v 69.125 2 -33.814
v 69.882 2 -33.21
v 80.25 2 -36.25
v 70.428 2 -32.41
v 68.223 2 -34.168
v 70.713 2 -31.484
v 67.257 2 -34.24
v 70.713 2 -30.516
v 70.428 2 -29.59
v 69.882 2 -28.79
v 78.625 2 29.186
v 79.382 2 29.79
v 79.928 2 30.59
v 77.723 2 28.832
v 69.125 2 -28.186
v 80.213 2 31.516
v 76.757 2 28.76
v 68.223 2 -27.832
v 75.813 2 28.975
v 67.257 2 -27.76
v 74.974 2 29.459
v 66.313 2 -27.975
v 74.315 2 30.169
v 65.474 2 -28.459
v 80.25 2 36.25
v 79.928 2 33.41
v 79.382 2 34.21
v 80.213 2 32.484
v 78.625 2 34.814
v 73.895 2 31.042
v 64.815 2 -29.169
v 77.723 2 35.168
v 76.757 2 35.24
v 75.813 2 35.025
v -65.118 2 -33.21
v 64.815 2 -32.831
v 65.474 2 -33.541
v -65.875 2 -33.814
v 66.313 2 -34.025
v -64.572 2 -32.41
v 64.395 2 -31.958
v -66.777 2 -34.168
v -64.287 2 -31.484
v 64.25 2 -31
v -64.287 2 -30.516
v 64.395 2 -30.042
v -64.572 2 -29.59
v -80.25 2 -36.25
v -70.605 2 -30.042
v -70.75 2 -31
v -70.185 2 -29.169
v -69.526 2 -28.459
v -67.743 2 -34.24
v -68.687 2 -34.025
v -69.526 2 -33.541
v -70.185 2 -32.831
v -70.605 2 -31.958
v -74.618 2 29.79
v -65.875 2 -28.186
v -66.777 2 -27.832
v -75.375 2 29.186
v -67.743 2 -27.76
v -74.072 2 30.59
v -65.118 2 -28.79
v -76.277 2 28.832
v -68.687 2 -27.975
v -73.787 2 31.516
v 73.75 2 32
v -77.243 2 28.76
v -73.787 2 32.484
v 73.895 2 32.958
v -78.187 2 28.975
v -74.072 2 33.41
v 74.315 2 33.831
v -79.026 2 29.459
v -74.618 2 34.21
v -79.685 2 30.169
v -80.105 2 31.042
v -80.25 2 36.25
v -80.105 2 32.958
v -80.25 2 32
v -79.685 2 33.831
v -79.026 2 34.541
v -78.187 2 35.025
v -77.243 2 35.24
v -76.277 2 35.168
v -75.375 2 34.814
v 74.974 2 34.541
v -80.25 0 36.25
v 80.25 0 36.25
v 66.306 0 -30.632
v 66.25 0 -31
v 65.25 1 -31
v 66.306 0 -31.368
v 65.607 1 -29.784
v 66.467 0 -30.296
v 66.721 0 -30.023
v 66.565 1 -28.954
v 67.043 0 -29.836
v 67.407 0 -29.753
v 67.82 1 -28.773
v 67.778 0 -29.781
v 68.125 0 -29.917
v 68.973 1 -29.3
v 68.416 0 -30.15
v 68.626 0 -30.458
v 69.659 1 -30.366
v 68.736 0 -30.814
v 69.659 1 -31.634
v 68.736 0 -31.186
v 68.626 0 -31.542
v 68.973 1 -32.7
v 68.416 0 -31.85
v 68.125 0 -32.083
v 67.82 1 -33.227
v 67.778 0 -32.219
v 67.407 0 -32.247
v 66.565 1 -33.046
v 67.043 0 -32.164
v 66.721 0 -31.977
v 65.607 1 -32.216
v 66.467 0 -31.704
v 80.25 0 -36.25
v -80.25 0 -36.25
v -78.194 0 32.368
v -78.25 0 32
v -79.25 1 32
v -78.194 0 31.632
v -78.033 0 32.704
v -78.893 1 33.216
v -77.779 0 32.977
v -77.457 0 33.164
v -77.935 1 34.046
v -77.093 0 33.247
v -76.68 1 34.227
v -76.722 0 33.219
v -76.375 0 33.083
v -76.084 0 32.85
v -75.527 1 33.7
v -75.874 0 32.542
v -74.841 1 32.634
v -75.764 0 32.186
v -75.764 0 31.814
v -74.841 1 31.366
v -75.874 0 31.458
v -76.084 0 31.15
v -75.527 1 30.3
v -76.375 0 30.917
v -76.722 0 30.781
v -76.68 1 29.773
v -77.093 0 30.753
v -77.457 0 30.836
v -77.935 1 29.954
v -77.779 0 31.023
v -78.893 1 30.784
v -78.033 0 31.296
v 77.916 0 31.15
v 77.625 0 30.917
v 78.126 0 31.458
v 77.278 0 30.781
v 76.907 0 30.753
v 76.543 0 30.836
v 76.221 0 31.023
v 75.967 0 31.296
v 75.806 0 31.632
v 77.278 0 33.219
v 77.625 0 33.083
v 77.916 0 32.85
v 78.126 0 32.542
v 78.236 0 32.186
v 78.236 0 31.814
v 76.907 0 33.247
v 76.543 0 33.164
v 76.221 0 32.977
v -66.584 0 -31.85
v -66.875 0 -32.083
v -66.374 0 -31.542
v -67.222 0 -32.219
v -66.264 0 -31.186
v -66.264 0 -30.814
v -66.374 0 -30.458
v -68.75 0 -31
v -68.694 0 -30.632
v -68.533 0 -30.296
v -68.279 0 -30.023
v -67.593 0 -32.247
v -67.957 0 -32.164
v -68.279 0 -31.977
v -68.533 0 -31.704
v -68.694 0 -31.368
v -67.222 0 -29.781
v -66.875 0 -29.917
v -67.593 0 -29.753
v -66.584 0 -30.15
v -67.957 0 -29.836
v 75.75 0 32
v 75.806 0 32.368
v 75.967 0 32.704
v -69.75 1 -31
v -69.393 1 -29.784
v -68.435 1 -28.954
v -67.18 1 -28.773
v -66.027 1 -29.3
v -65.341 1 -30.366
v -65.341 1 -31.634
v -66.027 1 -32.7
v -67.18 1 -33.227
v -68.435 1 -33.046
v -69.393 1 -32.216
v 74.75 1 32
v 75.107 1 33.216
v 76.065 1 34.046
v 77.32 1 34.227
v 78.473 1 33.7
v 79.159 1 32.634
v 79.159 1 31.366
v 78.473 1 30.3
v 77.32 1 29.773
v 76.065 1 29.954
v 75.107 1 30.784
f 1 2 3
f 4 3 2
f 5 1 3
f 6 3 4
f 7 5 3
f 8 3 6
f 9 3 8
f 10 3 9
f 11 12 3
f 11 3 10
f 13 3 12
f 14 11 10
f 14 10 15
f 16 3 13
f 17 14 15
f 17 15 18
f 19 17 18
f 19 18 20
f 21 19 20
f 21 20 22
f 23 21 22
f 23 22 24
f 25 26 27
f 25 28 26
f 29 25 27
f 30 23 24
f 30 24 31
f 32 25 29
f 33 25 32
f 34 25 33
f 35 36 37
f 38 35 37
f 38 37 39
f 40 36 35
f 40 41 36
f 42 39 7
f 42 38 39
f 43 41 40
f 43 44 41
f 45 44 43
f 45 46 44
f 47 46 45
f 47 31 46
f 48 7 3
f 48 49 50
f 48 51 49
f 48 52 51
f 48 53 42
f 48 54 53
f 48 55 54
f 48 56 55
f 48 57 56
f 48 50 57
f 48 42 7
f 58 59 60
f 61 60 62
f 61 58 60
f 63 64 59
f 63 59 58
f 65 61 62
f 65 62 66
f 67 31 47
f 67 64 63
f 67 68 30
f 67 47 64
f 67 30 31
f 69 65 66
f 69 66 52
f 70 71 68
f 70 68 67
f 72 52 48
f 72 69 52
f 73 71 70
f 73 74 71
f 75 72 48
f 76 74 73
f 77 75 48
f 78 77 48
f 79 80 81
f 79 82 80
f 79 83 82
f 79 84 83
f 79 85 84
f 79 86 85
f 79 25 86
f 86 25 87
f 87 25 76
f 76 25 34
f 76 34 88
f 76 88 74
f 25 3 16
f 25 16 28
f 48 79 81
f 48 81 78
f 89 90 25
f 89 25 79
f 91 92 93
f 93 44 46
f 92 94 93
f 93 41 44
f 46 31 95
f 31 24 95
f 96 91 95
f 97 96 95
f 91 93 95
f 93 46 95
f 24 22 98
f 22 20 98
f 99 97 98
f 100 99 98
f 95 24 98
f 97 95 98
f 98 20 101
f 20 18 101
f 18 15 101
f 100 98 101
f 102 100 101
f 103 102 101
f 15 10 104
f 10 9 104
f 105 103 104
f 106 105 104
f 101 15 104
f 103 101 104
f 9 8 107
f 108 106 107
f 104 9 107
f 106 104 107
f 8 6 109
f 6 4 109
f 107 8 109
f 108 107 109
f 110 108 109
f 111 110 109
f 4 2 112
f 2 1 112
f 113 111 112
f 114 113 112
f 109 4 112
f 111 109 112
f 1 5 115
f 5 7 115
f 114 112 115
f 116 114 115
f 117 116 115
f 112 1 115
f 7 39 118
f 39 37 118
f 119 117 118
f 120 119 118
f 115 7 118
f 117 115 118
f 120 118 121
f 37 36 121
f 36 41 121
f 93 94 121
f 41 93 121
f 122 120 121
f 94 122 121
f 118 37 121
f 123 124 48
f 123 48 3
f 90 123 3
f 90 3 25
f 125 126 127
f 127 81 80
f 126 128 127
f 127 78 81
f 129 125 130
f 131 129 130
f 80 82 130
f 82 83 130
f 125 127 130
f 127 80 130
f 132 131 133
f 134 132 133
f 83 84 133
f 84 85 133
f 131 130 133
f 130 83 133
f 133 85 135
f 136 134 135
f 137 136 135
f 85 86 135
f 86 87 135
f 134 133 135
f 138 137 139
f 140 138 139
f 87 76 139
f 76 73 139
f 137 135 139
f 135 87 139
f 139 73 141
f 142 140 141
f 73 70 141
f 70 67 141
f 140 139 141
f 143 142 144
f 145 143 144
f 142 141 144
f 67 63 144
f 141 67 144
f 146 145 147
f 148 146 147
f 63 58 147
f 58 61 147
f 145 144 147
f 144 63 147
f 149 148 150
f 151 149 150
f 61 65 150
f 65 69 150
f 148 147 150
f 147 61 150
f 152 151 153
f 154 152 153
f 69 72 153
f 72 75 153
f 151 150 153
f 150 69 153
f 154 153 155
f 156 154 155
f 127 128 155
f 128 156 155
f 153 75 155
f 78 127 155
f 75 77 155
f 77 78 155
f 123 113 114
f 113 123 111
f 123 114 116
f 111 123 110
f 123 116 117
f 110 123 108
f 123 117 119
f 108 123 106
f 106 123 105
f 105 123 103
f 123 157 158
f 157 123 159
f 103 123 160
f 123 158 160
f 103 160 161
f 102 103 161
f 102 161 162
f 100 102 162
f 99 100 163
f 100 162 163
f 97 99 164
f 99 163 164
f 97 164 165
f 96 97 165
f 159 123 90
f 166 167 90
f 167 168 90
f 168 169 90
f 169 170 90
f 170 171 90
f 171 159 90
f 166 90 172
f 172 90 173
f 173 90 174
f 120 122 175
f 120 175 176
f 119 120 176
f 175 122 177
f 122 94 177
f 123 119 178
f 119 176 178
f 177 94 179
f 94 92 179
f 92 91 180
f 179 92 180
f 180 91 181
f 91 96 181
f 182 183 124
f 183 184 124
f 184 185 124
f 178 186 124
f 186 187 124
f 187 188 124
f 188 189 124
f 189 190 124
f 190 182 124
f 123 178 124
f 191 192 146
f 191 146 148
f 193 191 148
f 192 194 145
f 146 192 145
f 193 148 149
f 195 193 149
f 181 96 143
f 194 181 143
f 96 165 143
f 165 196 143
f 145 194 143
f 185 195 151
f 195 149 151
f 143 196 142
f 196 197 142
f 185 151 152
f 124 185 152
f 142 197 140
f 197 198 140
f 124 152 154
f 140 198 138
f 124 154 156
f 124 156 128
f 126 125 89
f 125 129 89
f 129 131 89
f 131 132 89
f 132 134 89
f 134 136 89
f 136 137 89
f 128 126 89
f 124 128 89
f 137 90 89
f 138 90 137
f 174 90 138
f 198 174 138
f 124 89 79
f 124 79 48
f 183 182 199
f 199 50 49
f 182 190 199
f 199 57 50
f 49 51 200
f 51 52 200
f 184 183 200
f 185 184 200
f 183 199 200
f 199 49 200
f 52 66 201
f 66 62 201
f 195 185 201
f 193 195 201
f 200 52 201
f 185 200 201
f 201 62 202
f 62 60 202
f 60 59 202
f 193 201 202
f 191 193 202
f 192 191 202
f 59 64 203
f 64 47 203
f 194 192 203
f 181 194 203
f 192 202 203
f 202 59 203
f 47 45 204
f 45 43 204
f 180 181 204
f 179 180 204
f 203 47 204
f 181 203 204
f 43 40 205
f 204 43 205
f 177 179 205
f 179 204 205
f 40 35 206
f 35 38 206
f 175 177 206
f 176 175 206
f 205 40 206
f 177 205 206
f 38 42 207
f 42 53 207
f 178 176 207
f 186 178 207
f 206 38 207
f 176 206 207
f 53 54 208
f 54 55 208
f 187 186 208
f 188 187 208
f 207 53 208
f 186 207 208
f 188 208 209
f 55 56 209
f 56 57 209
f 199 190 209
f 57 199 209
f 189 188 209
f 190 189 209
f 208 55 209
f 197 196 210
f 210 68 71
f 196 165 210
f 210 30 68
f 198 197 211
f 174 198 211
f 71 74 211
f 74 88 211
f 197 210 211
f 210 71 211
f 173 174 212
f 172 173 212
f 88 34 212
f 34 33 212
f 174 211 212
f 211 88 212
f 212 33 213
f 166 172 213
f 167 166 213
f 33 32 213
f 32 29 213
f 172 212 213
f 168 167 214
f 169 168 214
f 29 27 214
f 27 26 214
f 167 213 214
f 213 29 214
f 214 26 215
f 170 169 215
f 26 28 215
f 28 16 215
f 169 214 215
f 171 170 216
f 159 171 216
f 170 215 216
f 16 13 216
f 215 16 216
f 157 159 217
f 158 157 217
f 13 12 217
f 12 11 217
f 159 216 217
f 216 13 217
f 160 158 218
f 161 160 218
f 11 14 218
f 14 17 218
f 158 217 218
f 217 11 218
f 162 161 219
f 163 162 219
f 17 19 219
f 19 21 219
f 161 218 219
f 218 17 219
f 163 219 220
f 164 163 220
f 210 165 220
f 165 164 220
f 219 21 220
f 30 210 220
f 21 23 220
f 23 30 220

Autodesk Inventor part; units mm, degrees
ref_plane "YZ Plane" through (0, 0, 0) normal (1, 0, 0) x (0, 1, 0)
ref_plane "XZ Plane" through (0, 0, 0) normal (0, 1, 0) x (-1, 0, 0)
ref_plane "XY Plane" through (0, 0, 0) normal (0, 0, 1) x (1, 0, 0)
sketch "Esquisse1" plane through (0, 0, 0) normal (0, 1, 0) x (-1, 0, 0)
  line L0 (-80.25, 36.25) -> (80.25, 36.25)
  line L1 (80.25, 36.25) -> (80.25, -36.25)
  line L2 (80.25, -36.25) -> (-80.25, -36.25)
  line L3 (-80.25, -36.25) -> (-80.25, 36.25)
  line L4 (0, -50.75) -> (0, 50.75) projected
  line L5 (112.35, 0) -> (-112.35, 0) projected
  circle A0 centre (77, 32) radius 1.25
  circle A1 centre (-77, 32) radius 1.25
  circle A2 centre (67.5, -31) radius 1.25
  circle A3 centre (-67.5, -31) radius 1.25
  point P0 (0, 0)
  dimension "d0" = 160.5
  dimension "d1" = 72.5
  dimension "d2" = 4.25
  dimension "d3" = 3.25
  dimension "d4" = 2.5
  dimension "d5" = 2.5
  dimension "d6" = 63
  dimension "d7" = 9.5
extrude "Extrusion1" add sketch "Esquisse1" along normal blind 2
chamfer "Chanfrein1" distance 2 angle 45 4 edges at (-66.25, 2, -31) (-75.75, 2, 32) (78.25, 2, 32) (68.75, 2, -31)
properties part number "couvercle"
